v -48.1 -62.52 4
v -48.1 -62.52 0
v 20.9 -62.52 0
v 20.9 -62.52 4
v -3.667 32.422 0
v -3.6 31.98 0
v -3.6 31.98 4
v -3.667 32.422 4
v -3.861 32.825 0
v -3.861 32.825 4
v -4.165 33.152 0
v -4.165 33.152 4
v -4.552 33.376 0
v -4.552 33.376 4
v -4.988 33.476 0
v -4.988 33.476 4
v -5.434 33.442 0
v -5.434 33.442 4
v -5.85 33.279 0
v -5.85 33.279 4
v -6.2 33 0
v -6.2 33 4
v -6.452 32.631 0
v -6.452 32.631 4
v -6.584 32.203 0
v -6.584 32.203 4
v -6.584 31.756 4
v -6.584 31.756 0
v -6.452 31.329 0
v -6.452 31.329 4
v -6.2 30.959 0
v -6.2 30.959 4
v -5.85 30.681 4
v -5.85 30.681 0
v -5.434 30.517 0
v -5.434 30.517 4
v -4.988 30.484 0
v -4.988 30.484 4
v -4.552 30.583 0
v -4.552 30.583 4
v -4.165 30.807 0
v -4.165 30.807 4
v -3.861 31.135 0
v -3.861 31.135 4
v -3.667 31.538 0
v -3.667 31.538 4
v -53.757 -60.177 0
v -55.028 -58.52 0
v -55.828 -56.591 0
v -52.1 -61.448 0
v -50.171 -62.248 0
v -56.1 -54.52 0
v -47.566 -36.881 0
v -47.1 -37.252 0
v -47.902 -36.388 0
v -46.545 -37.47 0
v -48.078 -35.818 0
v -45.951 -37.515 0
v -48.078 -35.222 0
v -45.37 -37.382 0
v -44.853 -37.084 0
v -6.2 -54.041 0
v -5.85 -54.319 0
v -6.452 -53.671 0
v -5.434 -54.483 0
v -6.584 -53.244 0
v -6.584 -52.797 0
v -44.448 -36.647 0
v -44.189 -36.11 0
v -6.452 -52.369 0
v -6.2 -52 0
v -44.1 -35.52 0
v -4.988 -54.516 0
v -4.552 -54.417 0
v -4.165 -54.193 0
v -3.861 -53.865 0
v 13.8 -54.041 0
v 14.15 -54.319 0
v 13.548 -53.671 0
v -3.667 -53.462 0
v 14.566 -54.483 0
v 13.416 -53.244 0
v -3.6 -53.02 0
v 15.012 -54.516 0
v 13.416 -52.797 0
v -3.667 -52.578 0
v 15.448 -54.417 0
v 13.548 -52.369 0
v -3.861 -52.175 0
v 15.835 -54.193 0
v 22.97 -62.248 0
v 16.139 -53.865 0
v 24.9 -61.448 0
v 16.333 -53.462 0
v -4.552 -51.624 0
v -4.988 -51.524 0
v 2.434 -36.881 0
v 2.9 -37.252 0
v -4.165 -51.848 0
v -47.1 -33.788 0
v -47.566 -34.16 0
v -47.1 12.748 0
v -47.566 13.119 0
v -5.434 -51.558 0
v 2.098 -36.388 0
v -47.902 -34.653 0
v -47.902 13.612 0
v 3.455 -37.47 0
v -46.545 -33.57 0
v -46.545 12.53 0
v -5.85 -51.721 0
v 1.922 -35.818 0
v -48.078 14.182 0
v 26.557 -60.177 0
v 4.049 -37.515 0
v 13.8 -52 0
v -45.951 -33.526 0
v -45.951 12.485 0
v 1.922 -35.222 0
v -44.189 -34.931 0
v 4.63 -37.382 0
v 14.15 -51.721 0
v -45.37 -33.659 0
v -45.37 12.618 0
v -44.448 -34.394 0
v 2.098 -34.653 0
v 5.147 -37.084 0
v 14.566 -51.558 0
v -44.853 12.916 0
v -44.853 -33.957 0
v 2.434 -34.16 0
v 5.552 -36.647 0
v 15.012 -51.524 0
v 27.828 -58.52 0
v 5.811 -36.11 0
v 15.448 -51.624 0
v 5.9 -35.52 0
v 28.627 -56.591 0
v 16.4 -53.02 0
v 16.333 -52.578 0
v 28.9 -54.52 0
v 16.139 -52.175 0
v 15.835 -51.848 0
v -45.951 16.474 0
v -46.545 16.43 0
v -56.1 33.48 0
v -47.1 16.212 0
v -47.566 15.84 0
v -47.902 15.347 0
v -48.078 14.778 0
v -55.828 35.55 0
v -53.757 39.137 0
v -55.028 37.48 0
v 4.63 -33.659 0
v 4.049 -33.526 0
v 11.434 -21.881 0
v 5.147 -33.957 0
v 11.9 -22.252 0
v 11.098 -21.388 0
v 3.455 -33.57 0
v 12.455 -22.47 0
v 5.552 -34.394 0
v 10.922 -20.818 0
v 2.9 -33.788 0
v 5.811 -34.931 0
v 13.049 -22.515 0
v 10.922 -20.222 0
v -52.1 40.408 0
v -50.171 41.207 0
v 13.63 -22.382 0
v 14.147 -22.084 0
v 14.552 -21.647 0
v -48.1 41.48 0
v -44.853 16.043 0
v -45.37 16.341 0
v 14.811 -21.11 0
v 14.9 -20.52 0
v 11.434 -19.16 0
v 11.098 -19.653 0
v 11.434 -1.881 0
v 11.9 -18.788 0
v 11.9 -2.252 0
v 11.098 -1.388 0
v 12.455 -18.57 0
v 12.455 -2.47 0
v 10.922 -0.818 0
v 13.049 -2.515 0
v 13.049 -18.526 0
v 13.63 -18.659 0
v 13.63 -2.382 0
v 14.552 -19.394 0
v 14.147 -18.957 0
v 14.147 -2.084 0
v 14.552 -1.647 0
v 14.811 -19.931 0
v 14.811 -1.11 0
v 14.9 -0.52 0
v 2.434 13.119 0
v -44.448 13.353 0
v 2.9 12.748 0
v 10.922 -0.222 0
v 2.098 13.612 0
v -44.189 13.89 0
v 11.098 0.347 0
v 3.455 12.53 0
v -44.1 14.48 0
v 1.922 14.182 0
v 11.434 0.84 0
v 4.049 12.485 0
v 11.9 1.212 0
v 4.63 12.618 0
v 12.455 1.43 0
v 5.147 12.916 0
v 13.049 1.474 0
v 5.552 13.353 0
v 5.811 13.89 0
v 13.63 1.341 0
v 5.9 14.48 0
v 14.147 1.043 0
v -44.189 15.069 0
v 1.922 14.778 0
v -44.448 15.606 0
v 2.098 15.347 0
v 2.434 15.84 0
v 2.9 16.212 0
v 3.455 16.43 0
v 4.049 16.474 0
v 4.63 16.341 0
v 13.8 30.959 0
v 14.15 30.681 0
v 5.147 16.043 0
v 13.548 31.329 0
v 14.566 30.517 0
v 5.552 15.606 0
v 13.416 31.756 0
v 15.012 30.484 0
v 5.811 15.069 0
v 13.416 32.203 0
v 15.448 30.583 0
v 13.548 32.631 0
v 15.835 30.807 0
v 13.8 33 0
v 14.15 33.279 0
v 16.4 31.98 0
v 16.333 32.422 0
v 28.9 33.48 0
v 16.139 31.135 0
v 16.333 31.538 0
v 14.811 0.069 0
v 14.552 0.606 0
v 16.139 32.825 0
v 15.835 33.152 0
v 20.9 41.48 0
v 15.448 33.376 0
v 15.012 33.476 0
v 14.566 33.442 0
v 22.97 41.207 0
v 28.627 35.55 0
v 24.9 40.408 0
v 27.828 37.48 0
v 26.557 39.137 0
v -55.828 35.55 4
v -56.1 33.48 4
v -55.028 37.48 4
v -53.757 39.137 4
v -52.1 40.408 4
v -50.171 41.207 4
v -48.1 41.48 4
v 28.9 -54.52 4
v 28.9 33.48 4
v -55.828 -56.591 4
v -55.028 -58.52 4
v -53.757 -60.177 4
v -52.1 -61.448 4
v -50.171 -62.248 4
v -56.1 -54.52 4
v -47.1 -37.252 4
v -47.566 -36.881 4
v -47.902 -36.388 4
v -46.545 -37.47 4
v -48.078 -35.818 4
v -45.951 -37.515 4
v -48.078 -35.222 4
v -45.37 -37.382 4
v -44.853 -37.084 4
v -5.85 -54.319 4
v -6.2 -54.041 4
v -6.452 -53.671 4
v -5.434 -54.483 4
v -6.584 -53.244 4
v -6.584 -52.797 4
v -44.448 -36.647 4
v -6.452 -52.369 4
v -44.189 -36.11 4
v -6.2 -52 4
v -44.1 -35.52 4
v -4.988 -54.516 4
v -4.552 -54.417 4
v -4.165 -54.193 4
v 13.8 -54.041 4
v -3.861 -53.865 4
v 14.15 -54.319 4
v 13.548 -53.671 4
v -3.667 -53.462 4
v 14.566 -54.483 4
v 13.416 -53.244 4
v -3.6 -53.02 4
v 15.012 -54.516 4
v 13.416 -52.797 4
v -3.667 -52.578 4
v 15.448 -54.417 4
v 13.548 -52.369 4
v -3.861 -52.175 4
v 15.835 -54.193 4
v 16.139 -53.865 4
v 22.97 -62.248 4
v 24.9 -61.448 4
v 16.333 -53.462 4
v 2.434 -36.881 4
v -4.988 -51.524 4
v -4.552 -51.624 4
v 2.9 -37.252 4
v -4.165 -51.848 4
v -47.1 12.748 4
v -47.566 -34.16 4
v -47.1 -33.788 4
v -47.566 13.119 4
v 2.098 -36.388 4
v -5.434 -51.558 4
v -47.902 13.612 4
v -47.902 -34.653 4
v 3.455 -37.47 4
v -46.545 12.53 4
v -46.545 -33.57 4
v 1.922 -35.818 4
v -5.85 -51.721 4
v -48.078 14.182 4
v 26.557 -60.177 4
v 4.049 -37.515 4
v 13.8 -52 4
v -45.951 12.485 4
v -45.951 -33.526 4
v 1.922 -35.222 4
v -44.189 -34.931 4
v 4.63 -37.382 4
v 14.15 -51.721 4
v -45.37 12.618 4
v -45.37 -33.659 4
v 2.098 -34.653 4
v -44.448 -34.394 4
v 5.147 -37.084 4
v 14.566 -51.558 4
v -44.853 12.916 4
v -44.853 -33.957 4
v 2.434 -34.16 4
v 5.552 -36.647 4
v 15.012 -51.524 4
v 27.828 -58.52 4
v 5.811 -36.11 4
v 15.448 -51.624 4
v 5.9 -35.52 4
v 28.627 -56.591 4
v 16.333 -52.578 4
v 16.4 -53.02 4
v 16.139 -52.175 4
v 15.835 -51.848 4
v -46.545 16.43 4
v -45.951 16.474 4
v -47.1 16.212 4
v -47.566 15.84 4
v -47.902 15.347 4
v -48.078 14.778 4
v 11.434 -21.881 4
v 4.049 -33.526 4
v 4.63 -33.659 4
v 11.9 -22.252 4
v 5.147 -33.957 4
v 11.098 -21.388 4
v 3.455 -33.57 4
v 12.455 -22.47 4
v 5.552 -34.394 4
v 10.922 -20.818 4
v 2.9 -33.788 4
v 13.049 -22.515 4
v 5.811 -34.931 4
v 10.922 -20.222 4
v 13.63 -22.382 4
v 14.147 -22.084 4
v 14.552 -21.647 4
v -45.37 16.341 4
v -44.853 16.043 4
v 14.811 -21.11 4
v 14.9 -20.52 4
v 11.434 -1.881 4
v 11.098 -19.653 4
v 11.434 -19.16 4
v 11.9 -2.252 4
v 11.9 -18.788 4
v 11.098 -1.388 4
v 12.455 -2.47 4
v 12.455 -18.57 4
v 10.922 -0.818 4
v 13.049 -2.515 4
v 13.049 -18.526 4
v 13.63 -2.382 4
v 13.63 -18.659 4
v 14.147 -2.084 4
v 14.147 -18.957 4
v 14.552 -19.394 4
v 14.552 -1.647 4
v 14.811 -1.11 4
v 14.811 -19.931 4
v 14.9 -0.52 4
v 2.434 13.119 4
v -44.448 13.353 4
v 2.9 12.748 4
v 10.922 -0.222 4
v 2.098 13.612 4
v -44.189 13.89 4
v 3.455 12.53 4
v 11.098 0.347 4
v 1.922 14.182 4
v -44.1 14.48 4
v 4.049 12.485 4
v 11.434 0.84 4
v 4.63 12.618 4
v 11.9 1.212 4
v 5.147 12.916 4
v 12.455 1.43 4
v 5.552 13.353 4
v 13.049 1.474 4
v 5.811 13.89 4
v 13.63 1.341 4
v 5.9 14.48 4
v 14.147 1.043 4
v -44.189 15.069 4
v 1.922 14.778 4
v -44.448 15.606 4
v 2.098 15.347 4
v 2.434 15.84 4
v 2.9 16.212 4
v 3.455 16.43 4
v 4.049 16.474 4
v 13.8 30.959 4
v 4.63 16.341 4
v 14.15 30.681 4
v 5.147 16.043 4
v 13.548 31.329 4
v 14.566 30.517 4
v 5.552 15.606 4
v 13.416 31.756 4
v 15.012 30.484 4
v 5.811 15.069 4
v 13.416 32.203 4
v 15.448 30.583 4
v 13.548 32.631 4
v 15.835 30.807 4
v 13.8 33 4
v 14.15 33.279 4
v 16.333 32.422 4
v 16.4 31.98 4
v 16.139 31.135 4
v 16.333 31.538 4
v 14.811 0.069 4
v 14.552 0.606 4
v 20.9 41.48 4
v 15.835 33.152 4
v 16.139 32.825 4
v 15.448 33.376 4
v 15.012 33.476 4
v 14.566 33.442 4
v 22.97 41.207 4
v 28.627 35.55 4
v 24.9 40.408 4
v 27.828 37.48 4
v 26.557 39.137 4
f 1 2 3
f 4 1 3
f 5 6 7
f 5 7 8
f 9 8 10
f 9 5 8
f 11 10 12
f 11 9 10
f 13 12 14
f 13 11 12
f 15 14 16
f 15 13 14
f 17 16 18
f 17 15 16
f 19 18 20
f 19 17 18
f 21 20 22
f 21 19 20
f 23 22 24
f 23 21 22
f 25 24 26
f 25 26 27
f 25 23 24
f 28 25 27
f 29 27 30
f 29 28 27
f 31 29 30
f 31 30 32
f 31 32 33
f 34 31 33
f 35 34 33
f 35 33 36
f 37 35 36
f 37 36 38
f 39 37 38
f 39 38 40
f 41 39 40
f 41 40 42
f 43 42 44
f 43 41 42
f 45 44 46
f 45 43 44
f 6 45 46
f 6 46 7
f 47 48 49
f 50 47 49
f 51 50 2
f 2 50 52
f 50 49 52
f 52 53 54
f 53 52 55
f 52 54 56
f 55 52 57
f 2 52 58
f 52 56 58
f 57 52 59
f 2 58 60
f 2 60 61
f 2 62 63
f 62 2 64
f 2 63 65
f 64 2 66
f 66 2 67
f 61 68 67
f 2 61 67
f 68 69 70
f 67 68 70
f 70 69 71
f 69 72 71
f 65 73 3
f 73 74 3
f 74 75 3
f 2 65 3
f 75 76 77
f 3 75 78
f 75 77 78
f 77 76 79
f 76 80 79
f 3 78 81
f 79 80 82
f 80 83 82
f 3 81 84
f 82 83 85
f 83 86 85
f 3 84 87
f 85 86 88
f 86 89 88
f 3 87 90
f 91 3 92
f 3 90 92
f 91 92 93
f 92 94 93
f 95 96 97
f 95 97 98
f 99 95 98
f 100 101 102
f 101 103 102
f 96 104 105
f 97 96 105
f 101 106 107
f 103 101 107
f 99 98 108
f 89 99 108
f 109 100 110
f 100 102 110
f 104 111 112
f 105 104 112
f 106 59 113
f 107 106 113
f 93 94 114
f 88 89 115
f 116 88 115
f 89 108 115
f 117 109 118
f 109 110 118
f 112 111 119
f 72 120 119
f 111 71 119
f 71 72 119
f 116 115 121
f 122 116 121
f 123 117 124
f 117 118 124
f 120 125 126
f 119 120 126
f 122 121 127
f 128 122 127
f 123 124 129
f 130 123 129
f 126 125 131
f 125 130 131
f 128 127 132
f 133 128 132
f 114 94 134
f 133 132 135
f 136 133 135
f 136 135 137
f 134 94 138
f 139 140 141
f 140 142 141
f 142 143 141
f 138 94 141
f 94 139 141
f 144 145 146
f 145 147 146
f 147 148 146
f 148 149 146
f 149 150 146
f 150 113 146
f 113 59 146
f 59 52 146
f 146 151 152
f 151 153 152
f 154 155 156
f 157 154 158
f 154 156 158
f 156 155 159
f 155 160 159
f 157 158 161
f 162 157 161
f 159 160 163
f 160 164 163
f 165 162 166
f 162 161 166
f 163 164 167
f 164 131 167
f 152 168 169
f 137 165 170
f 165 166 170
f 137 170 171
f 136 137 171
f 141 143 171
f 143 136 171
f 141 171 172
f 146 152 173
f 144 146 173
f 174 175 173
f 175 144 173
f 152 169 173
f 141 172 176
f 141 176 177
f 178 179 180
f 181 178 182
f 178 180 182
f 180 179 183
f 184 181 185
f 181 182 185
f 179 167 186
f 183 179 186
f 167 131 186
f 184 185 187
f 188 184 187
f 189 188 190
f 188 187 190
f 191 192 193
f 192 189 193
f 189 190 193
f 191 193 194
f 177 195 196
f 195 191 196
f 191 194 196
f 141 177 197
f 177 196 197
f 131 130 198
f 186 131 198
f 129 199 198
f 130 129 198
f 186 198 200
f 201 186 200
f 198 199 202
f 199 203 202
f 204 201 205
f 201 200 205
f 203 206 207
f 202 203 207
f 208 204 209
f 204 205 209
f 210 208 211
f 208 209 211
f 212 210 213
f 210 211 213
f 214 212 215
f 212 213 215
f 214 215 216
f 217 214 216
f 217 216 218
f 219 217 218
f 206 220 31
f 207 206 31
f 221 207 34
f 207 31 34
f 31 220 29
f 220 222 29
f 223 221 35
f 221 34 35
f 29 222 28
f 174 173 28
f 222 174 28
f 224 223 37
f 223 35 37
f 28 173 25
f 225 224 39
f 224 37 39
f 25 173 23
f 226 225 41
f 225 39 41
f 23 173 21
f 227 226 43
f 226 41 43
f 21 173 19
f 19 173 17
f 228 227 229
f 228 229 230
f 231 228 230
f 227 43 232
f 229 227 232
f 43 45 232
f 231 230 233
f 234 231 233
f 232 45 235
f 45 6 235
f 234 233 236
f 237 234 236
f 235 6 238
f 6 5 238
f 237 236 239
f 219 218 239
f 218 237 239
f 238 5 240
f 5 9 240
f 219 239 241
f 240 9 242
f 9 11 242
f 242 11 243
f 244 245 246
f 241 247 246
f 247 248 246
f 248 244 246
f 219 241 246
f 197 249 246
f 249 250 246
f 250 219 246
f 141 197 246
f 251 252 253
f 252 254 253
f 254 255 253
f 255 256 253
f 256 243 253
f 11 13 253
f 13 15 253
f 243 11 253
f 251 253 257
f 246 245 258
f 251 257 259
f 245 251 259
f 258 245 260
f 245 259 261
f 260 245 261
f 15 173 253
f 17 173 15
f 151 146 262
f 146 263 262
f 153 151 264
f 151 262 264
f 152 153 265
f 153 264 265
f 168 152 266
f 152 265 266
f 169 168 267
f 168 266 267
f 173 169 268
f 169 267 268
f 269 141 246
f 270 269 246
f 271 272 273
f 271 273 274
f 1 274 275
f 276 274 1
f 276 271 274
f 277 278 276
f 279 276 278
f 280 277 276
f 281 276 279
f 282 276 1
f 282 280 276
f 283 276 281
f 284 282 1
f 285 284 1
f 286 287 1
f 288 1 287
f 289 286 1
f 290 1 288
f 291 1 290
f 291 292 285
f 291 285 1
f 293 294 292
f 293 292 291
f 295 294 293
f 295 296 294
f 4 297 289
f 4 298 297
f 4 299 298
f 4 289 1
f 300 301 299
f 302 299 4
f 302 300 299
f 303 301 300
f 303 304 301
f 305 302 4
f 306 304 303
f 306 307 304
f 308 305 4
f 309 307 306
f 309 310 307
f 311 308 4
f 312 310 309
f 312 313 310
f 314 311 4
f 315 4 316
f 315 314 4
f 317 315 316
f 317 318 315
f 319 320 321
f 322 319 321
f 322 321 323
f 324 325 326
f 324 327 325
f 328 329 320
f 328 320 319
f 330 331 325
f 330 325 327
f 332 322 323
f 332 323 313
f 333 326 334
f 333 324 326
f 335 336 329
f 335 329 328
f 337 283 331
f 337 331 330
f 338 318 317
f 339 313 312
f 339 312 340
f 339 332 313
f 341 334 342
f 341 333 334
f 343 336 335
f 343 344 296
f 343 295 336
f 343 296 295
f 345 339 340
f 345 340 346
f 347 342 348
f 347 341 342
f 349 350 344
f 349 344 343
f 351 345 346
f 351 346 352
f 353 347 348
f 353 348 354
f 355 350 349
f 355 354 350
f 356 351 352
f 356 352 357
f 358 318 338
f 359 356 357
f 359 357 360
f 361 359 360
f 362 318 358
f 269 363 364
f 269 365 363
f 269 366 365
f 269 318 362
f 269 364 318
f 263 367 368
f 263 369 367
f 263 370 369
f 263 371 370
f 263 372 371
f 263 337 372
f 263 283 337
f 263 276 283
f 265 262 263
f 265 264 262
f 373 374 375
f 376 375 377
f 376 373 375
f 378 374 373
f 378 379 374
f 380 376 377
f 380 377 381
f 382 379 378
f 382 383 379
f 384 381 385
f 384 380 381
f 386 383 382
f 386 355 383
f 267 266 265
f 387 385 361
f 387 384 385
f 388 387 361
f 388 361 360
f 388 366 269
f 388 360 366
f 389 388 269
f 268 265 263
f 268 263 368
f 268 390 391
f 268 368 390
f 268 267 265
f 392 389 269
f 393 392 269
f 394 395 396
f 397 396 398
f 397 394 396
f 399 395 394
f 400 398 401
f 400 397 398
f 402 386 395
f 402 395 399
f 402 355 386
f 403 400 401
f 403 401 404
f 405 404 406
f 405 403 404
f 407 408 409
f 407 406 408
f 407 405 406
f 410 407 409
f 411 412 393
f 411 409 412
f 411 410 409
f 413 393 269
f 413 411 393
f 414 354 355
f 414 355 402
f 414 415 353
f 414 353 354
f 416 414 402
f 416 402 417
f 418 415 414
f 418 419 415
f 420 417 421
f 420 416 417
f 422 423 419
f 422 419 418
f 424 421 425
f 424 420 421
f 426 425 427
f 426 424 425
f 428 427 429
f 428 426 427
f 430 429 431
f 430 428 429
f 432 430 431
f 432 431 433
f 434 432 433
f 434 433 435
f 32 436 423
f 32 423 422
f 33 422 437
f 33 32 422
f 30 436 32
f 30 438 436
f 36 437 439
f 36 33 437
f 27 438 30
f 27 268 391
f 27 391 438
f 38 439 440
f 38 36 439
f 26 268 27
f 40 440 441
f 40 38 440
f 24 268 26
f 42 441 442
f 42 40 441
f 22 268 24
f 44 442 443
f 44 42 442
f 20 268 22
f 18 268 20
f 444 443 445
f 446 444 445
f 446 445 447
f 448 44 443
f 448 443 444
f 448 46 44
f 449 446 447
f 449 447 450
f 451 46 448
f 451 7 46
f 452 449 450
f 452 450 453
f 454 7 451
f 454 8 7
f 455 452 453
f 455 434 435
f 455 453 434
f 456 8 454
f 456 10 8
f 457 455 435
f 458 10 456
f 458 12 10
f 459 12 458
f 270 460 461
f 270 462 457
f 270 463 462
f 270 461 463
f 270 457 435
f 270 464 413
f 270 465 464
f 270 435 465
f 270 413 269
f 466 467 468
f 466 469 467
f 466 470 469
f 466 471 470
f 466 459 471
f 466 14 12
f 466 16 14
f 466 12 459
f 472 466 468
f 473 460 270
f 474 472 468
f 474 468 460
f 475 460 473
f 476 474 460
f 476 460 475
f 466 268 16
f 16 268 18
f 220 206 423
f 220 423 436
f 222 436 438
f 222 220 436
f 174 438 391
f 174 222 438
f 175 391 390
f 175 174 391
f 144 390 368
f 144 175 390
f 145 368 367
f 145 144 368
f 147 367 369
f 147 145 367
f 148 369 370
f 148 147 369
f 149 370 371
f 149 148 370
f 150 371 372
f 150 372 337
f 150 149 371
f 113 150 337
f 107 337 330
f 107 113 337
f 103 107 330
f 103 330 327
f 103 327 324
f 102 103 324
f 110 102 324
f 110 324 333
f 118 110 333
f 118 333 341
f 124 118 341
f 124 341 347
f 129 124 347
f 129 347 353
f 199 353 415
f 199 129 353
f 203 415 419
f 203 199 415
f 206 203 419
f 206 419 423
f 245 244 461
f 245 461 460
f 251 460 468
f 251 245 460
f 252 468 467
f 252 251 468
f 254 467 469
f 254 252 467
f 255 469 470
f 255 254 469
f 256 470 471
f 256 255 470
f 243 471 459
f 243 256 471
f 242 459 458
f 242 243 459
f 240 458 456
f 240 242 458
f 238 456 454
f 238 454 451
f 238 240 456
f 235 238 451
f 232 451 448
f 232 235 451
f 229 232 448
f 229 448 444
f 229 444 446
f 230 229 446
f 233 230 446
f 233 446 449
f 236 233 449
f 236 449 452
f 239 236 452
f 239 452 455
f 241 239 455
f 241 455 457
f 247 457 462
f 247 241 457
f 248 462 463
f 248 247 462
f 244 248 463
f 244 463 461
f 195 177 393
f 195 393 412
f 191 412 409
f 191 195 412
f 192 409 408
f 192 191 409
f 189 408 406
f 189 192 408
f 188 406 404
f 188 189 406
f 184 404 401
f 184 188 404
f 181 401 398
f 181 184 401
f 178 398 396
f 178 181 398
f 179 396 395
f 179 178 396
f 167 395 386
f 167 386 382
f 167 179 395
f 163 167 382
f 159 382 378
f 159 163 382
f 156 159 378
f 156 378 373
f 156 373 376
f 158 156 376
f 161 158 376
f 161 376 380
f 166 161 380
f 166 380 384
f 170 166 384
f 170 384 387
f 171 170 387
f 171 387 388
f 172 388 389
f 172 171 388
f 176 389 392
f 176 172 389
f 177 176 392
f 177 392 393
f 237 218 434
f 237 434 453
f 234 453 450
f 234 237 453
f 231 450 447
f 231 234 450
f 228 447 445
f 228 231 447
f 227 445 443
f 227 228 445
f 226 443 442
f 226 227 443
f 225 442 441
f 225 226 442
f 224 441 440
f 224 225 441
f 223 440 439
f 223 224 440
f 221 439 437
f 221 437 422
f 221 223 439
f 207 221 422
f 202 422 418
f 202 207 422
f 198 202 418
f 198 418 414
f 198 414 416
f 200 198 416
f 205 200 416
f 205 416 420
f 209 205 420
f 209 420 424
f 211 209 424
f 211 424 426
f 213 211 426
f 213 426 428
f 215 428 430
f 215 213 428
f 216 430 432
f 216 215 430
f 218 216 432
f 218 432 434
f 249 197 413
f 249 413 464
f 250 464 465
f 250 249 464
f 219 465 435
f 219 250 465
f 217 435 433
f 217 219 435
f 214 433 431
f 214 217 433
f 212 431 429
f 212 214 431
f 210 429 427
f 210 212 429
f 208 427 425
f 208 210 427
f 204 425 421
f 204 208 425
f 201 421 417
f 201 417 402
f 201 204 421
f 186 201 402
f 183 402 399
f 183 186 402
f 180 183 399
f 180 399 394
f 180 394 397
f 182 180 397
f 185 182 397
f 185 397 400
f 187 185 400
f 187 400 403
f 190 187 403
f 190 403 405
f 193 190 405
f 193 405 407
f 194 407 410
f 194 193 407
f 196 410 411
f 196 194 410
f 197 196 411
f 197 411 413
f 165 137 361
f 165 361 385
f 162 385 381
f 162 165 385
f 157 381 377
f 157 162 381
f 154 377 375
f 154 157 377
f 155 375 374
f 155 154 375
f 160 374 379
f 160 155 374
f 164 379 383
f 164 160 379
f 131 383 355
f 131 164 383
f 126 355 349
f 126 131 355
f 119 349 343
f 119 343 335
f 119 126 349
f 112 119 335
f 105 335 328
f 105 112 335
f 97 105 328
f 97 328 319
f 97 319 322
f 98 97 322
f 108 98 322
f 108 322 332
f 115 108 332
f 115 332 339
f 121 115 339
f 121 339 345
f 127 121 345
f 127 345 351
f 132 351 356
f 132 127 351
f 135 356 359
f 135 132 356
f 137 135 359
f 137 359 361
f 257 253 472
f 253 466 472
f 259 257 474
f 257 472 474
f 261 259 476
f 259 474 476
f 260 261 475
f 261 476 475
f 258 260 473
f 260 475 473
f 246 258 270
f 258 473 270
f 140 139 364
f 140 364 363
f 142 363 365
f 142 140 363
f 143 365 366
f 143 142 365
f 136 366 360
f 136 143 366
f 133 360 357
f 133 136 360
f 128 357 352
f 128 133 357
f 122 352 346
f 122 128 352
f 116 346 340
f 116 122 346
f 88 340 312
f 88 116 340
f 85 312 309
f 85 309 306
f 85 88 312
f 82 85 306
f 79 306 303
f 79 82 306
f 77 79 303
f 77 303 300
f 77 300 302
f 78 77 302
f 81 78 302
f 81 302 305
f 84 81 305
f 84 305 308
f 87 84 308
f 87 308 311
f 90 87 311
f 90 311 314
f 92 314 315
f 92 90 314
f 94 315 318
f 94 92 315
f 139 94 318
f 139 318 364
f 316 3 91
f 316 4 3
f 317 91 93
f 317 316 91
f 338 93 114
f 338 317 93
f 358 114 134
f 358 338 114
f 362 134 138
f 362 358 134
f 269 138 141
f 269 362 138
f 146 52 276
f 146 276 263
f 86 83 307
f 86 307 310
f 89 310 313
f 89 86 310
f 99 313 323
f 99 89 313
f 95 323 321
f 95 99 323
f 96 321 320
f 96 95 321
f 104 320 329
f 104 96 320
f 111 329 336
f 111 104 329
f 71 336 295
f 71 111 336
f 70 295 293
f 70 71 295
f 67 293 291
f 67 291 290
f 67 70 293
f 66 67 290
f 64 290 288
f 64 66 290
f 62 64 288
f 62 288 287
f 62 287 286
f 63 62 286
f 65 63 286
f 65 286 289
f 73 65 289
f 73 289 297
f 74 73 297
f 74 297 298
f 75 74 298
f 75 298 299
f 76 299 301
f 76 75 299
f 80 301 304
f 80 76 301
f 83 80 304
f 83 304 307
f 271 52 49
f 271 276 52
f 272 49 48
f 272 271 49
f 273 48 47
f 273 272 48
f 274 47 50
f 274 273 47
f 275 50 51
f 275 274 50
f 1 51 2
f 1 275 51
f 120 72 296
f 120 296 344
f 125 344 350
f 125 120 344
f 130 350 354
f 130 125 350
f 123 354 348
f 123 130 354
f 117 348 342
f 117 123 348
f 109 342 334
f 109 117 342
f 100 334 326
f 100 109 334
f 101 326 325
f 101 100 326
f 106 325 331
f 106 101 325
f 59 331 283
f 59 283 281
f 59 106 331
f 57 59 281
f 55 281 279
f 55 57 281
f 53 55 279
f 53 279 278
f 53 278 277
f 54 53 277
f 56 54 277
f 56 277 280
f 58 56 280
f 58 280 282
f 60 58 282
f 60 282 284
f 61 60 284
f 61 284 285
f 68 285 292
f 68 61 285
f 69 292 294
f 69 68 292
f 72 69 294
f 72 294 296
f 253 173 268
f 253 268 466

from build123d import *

# Parameters (mm, degrees)
SKETCH_1_W      = 85
SKETCH_1_H      = 104
SKETCH_1_R      = 2
SKETCH_1_R_2    = 1.5
EXTRUDE_1_DEPTH = 4
FILLET_1_R      = 8


with BuildPart() as part:
    # 草图1 → 凸台-拉伸1 (new body)
    with BuildSketch(Plane.XY):
        with Locations((-13.600288588, -10.520274333)):
            Rectangle(SKETCH_1_W, SKETCH_1_H)
        with Locations((12.899711412, -0.520274333)):
            Circle(SKETCH_1_R, mode=Mode.SUBTRACT)
        with Locations((12.899711412, -20.520274333)):
            Circle(SKETCH_1_R, mode=Mode.SUBTRACT)
        with Locations((-46.100288588, 14.479725667)):
            Circle(SKETCH_1_R, mode=Mode.SUBTRACT)
        with Locations((-46.100288588, -35.520274333)):
            Circle(SKETCH_1_R, mode=Mode.SUBTRACT)
        with Locations((3.899711412, -35.520274333)):
            Circle(SKETCH_1_R, mode=Mode.SUBTRACT)
        with Locations((3.899711412, 14.479725667)):
            Circle(SKETCH_1_R, mode=Mode.SUBTRACT)
        with Locations((-5.100288588, 31.979725667)):
            Circle(SKETCH_1_R_2, mode=Mode.SUBTRACT)
        with Locations((14.899711412, 31.979725667)):
            Circle(SKETCH_1_R_2, mode=Mode.SUBTRACT)
        with Locations((-5.100288588, -53.020274333)):
            Circle(SKETCH_1_R_2, mode=Mode.SUBTRACT)
        with Locations((14.899711412, -53.020274333)):
            Circle(SKETCH_1_R_2, mode=Mode.SUBTRACT)
    extrude(amount=EXTRUDE_1_DEPTH)

    # 圆角1
    fillet_1_edges = [part.edges().sort_by_distance(p)[0] for p in [
        (28.899711412, -62.520274333, 2),
        (-56.100288588, -62.520274333, 2),
        (-56.100288588, 41.479725667, 2),
        (28.899711412, 41.479725667, 2),
    ]]
    fillet(fillet_1_edges, radius=FILLET_1_R)


solid = part.part
